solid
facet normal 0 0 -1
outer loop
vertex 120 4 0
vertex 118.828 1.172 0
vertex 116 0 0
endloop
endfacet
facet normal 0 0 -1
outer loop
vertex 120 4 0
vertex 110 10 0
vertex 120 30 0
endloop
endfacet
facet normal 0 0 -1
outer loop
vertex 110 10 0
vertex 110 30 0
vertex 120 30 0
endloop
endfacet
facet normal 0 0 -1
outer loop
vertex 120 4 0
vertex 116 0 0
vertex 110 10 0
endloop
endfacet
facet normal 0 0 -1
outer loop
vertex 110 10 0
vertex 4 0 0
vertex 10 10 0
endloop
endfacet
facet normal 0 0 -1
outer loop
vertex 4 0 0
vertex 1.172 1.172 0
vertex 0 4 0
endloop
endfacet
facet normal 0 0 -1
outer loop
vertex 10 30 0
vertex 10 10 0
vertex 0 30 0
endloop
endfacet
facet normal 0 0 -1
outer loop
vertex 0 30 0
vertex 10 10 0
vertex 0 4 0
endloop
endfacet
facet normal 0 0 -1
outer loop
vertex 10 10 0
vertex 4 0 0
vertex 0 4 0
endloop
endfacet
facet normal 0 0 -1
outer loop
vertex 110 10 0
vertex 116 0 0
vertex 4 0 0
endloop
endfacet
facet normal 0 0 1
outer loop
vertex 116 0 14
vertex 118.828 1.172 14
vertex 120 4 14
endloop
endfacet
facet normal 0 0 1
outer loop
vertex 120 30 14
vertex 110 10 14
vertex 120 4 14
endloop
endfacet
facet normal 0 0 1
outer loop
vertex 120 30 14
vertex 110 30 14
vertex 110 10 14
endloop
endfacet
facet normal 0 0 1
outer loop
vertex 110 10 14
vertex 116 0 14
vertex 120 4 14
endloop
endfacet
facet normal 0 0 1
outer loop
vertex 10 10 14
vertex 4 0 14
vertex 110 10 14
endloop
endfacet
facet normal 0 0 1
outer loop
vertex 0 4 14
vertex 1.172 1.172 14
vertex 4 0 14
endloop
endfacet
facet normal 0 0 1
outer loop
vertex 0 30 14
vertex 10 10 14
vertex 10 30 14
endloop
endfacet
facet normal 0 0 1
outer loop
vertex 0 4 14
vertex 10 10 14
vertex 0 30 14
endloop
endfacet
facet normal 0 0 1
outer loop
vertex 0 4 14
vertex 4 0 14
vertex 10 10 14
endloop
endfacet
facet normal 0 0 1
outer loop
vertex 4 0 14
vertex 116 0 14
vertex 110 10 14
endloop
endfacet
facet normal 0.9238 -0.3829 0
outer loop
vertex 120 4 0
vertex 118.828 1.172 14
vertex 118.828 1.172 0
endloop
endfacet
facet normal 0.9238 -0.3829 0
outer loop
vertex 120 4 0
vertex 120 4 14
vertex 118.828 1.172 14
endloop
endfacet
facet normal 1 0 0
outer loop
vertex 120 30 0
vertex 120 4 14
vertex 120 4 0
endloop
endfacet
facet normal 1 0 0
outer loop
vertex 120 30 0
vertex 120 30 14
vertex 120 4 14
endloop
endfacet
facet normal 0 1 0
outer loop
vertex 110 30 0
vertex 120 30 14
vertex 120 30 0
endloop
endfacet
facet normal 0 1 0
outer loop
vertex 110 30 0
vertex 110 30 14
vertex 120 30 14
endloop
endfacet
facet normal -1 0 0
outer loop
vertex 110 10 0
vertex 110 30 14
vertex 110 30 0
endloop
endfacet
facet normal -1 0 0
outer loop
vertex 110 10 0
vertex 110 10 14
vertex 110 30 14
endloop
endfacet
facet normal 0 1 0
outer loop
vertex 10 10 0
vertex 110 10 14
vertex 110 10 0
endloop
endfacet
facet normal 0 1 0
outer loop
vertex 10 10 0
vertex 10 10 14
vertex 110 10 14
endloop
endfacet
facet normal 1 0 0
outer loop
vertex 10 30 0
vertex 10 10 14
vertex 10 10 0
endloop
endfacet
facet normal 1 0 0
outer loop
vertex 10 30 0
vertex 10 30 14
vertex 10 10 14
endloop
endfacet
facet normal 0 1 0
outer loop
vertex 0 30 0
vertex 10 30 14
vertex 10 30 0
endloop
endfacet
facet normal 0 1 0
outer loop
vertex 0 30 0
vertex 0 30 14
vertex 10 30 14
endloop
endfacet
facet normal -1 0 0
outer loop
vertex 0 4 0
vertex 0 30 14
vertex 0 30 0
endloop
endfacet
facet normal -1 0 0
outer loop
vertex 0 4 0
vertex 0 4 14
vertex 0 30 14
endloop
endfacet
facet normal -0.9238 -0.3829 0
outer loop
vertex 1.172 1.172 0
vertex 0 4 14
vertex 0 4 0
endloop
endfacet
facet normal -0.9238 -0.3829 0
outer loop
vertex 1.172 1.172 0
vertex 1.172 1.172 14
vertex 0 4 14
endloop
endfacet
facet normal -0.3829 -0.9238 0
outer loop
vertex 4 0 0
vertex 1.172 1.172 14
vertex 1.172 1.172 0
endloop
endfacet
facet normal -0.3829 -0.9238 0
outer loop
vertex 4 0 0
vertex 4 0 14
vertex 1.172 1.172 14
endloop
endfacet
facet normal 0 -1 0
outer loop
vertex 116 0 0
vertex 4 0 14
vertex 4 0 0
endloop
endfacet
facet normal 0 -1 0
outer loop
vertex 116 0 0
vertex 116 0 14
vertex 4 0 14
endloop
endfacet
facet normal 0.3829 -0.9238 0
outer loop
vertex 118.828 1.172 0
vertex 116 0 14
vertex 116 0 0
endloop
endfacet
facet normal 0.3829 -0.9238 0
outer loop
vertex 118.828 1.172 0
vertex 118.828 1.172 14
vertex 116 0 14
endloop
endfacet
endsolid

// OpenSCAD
$fn = 32;

// ----------------------------------------------------------------------
// Heat sink frame: 120 x 30 mm frame, 10 mm walls
// ----------------------------------------------------------------------

// --- parameters (mm) ---
profile_height = 14;      // extrusion height
profile_points = 12;      // points of the closed outline

profile = [[0, 4], [1.172, 1.172], [4, 0], [116, 0], [118.828, 1.172], [120, 4], [120, 30], [110, 30], [110, 10], [10, 10], [10, 30], [0, 30]];  // single closed polygon, 12 points, counter clockwise

// --- the one profile operation ---
linear_extrude(height = profile_height) polygon(points = profile);
